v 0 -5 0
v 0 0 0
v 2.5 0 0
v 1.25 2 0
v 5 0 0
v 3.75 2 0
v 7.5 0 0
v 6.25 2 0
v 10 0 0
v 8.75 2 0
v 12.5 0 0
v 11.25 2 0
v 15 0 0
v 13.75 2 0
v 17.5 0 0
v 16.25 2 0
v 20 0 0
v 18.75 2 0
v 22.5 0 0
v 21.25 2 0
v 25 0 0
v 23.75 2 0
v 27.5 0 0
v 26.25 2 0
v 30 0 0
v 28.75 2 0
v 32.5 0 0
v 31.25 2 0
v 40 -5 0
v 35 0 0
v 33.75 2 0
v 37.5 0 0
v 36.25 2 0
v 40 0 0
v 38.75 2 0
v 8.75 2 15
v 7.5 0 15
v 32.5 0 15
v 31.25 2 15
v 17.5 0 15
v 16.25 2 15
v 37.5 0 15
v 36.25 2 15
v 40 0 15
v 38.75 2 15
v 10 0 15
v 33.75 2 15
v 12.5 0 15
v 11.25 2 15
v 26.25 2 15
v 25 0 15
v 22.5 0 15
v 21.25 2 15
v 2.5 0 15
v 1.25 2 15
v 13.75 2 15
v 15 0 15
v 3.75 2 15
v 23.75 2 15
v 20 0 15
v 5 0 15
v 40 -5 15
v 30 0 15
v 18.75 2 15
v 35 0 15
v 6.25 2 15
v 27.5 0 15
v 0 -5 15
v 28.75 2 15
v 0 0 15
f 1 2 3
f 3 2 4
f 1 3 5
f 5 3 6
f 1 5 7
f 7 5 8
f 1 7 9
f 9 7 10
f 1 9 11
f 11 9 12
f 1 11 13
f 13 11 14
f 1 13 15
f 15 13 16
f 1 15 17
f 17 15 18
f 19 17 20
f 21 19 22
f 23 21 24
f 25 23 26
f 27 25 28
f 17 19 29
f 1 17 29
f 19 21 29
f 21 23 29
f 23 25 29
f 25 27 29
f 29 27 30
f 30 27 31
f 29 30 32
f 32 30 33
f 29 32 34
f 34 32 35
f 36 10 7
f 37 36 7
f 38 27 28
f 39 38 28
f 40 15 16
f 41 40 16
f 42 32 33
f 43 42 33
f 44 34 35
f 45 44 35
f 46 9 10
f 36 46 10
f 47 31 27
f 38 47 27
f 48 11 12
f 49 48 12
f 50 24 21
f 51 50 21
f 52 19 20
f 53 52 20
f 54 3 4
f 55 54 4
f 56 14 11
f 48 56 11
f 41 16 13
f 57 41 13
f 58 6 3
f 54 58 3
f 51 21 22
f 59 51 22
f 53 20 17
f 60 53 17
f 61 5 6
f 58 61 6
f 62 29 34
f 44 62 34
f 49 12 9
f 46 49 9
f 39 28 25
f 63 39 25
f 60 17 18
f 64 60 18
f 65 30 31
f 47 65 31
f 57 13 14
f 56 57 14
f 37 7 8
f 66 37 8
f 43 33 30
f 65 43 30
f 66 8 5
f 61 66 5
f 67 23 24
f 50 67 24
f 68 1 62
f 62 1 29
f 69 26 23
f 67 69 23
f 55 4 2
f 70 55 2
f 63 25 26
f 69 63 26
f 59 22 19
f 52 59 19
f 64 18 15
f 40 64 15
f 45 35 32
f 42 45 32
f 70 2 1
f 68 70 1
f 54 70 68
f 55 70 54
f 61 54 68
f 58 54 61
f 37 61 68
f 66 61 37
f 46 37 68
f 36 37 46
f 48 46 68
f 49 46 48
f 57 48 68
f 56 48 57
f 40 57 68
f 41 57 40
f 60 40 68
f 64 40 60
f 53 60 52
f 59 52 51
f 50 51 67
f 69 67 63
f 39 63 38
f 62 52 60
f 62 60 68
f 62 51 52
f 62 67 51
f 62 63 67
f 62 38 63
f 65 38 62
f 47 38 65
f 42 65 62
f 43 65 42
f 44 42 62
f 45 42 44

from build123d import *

# Parameters (mm, degrees)
BOSS_EXTRUDE1_DEPTH = 15


with BuildPart() as part:
    # Sketch1 → Boss-Extrude1 (new body)
    with BuildSketch(Plane.XY):
        Polygon((40, 0), (38.75, 2), (37.5, 0), (36.25, 2), (35, 0), (33.75, 2), (32.5, 0), (31.25, 2), (30, 0), (28.75, 2), (27.5, 0), (26.25, 2), (25, 0), (23.75, 2), (22.5, 0), (21.25, 2), (20, 0), (18.75, 2), (17.5, 0), (16.25, 2), (15, 0), (13.75, 2), (12.5, 0), (11.25, 2), (10, 0), (8.75, 2), (7.5, 0), (6.25, 2), (5, 0), (3.75, 2), (2.5, 0), (1.25, 2), (0, 0), (0, -5), (40, -5), align=None)
    extrude(amount=BOSS_EXTRUDE1_DEPTH)


solid = part.part
